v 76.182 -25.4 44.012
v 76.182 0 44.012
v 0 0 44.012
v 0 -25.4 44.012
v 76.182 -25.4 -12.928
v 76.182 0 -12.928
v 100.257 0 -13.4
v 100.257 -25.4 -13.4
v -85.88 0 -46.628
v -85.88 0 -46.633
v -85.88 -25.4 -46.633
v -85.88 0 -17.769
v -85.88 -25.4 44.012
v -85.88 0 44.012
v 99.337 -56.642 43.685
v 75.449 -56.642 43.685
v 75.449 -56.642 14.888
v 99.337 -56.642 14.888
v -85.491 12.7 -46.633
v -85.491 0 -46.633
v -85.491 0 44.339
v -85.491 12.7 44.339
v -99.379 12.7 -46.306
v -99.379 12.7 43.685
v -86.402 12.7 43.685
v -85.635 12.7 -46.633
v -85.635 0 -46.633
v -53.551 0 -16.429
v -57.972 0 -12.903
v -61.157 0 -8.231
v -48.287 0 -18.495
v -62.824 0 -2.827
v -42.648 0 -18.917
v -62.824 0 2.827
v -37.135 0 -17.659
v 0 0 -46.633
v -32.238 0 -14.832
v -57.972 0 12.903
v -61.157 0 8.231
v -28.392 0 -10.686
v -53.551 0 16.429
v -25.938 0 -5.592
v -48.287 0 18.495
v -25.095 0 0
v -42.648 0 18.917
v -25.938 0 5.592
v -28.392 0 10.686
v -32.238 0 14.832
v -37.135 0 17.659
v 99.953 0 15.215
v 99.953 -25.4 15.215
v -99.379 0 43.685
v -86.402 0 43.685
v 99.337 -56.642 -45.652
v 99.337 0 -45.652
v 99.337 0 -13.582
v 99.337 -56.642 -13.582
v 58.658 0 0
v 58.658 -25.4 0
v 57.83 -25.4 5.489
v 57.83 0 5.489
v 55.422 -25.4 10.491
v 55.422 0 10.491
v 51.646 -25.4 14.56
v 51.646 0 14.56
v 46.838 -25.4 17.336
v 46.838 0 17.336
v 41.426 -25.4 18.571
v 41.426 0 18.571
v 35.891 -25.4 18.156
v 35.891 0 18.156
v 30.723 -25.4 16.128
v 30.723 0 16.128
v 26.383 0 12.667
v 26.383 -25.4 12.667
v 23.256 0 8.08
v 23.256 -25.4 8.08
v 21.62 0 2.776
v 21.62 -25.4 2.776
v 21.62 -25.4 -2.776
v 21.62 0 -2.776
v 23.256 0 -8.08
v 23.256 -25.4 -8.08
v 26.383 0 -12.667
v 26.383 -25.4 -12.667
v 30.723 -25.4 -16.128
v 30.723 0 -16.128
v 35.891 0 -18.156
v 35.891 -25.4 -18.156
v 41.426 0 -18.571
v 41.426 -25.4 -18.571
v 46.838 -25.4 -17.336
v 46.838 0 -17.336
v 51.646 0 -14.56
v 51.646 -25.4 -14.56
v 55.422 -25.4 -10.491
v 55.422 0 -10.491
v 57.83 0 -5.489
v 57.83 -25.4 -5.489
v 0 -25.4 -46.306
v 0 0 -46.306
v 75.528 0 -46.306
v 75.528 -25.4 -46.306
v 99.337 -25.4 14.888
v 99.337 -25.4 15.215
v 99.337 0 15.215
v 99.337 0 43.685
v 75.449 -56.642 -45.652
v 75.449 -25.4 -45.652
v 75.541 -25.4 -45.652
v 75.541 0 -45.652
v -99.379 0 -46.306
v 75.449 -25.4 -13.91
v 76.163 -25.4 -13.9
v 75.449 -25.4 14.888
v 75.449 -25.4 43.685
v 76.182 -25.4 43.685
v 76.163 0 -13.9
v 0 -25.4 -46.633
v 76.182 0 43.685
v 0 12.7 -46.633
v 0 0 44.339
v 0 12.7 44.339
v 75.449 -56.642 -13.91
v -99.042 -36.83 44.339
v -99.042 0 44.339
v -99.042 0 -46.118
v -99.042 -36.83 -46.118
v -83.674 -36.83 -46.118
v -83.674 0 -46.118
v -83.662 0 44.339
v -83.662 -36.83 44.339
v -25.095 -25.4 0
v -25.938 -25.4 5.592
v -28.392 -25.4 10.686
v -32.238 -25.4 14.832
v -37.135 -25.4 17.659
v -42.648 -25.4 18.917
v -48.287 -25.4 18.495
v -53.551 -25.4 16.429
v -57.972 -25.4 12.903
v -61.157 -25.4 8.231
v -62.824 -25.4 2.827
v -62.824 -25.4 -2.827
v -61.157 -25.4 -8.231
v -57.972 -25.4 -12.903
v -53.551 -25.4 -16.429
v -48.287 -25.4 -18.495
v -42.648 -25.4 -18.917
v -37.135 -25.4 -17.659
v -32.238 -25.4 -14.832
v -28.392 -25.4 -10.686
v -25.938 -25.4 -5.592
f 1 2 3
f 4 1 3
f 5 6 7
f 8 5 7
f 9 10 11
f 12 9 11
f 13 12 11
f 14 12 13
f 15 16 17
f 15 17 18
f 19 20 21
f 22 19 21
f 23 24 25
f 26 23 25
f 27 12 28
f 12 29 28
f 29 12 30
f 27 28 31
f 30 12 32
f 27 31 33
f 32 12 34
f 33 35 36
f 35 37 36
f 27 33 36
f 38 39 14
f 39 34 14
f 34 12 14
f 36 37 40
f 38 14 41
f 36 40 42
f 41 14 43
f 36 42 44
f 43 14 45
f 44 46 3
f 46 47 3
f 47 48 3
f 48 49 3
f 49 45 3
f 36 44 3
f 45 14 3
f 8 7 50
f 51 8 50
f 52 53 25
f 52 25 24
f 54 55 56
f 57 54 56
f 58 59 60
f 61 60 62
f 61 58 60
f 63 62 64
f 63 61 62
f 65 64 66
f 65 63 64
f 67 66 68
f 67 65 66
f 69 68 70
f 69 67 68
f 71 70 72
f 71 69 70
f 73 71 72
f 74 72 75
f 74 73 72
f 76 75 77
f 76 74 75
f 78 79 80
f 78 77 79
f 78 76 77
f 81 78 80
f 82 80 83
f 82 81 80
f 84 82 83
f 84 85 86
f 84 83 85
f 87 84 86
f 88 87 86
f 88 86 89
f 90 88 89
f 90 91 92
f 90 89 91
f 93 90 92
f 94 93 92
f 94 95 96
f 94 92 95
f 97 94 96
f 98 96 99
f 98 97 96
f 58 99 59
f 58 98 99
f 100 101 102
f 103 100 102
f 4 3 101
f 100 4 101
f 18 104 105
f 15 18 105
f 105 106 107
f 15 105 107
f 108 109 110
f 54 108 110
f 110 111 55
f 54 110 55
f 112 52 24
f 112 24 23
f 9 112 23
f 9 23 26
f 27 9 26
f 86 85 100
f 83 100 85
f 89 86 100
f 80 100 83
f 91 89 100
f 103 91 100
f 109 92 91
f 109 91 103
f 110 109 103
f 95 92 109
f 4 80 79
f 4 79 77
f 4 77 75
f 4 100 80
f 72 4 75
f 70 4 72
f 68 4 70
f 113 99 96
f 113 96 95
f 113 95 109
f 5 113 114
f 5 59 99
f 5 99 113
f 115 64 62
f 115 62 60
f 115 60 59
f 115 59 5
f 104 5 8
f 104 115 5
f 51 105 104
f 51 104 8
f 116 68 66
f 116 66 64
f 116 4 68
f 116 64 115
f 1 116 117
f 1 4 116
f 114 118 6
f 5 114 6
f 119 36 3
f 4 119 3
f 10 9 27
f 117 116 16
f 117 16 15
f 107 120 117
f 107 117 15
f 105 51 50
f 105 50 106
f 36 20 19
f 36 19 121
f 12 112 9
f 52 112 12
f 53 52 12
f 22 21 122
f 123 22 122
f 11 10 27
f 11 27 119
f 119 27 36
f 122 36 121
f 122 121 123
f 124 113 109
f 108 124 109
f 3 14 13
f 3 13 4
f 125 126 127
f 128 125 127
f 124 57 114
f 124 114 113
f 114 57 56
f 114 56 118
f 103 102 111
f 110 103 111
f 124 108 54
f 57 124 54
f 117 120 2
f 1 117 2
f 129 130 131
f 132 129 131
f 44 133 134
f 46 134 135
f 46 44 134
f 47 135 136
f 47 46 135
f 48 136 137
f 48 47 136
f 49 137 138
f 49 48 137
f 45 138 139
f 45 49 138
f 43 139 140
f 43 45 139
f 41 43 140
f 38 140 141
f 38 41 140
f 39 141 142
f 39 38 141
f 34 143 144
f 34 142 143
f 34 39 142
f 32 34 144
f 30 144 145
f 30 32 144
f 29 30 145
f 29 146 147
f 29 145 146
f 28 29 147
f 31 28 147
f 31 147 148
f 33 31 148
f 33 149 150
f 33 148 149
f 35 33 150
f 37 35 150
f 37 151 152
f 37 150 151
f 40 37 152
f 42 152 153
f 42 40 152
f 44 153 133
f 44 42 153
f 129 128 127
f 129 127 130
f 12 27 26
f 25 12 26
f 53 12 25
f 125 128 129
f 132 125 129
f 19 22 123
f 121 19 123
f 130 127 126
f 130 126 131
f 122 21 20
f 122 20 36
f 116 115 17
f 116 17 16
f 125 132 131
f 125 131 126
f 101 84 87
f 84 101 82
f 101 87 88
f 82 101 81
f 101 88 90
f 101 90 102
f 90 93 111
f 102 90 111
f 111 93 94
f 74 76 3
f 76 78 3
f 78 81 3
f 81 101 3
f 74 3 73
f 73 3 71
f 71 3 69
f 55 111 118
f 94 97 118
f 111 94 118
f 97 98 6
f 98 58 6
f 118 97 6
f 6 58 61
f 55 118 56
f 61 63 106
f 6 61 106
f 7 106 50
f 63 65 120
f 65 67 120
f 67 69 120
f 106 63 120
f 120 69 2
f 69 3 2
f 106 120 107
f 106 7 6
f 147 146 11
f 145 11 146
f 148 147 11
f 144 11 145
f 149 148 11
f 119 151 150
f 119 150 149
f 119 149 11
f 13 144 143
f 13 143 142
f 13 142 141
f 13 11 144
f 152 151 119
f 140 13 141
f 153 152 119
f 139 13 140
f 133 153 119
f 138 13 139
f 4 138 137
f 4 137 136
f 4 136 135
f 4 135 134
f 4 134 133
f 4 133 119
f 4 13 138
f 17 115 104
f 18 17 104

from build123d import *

# Parameters (mm, degrees)
F0_W      = 85.491411
F0_H      = 90.972517
F1_DEPTH  = 12.7
F3_DEPTH  = 25.4
F4_W      = 85.880384
F4_H      = 90.645276
F5_DEPTH  = 25.4
F6_W      = 23.888468
F6_H      = 28.797055
F7_DEPTH  = 56.642
F9_DEPTH  = 12.7
F11_DEPTH = 36.83
F12_R     = 18.622851
F12_R_2   = 18.970339
F13_DEPTH = 96.266


with BuildPart() as f1:
    # F0 (on Front) → F1 (new body)
    with BuildSketch(Plane.XZ):
        with Locations((-42.745705, -1.147197)):
            Rectangle(F0_W, F0_H)
    extrude(amount=-F1_DEPTH)


with BuildPart() as f3:
    # F2 (on Front) → F3 (new body)
    with BuildSketch(Plane.XZ):
        Polygon((76.182395, 44.01182), (0, 44.01182), (0, -46.306219), (75.527914, -46.306219), (76.182395, -12.927811), (100.257024, -13.399864), (99.952981, 15.214765), (76.182395, 15.214765), align=None)
    extrude(amount=F3_DEPTH)

    # F6 (on Front) → F7 (join)
    with BuildSketch(Plane.XZ):
        with Locations((87.392807, 29.286055)):
            Rectangle(F6_W, F6_H)
        Polygon((75.448573, -13.909529), (75.448573, -45.651741), (99.337041, -45.651741), (99.337041, -13.582289), align=None)
    extrude(amount=F7_DEPTH)


with BuildPart() as f5:
    # F4 (on Front) → F5 (new body)
    with BuildSketch(Plane.XZ):
        with Locations((-42.940192, -1.310818)):
            Rectangle(F4_W, F4_H)
    extrude(amount=F5_DEPTH)

    # F8 (on Front) → F9 (join)
    with BuildSketch(Plane.XZ):
        Polygon((-85.635334, -46.633456), (-86.402111, 43.684583), (-99.379383, 43.684583), (-99.379383, -46.306219), align=None)
    extrude(amount=-F9_DEPTH)


with BuildPart() as f11:
    # F10 (on Front) → F11 (new body)
    with BuildSketch(Plane.XZ):
        Polygon((-83.673954, -46.118326), (-83.661675, 44.339061), (-99.041916, 44.339061), (-99.041916, -46.118326), align=None)
    extrude(amount=F11_DEPTH)


with BuildPart() as f13_tool:
    # F12 (on Front) → F13 (new body)
    with BuildSketch(Plane.XZ):
        with Locations((40.034771, 0)):
            Circle(F12_R)
        with Locations((-44.065721, 0)):
            Circle(F12_R_2)
    extrude(amount=F13_DEPTH)


with BuildPart() as f3_1:
    add(f3.part)

    # F13: cut by f13_tool
    add(f13_tool.part, mode=Mode.SUBTRACT)


with BuildPart() as f5_1:
    add(f5.part)

    # F13: cut by f13_tool
    add(f13_tool.part, mode=Mode.SUBTRACT)


solid = Compound([f1.part, f11.part, f3_1.part, f5_1.part])
